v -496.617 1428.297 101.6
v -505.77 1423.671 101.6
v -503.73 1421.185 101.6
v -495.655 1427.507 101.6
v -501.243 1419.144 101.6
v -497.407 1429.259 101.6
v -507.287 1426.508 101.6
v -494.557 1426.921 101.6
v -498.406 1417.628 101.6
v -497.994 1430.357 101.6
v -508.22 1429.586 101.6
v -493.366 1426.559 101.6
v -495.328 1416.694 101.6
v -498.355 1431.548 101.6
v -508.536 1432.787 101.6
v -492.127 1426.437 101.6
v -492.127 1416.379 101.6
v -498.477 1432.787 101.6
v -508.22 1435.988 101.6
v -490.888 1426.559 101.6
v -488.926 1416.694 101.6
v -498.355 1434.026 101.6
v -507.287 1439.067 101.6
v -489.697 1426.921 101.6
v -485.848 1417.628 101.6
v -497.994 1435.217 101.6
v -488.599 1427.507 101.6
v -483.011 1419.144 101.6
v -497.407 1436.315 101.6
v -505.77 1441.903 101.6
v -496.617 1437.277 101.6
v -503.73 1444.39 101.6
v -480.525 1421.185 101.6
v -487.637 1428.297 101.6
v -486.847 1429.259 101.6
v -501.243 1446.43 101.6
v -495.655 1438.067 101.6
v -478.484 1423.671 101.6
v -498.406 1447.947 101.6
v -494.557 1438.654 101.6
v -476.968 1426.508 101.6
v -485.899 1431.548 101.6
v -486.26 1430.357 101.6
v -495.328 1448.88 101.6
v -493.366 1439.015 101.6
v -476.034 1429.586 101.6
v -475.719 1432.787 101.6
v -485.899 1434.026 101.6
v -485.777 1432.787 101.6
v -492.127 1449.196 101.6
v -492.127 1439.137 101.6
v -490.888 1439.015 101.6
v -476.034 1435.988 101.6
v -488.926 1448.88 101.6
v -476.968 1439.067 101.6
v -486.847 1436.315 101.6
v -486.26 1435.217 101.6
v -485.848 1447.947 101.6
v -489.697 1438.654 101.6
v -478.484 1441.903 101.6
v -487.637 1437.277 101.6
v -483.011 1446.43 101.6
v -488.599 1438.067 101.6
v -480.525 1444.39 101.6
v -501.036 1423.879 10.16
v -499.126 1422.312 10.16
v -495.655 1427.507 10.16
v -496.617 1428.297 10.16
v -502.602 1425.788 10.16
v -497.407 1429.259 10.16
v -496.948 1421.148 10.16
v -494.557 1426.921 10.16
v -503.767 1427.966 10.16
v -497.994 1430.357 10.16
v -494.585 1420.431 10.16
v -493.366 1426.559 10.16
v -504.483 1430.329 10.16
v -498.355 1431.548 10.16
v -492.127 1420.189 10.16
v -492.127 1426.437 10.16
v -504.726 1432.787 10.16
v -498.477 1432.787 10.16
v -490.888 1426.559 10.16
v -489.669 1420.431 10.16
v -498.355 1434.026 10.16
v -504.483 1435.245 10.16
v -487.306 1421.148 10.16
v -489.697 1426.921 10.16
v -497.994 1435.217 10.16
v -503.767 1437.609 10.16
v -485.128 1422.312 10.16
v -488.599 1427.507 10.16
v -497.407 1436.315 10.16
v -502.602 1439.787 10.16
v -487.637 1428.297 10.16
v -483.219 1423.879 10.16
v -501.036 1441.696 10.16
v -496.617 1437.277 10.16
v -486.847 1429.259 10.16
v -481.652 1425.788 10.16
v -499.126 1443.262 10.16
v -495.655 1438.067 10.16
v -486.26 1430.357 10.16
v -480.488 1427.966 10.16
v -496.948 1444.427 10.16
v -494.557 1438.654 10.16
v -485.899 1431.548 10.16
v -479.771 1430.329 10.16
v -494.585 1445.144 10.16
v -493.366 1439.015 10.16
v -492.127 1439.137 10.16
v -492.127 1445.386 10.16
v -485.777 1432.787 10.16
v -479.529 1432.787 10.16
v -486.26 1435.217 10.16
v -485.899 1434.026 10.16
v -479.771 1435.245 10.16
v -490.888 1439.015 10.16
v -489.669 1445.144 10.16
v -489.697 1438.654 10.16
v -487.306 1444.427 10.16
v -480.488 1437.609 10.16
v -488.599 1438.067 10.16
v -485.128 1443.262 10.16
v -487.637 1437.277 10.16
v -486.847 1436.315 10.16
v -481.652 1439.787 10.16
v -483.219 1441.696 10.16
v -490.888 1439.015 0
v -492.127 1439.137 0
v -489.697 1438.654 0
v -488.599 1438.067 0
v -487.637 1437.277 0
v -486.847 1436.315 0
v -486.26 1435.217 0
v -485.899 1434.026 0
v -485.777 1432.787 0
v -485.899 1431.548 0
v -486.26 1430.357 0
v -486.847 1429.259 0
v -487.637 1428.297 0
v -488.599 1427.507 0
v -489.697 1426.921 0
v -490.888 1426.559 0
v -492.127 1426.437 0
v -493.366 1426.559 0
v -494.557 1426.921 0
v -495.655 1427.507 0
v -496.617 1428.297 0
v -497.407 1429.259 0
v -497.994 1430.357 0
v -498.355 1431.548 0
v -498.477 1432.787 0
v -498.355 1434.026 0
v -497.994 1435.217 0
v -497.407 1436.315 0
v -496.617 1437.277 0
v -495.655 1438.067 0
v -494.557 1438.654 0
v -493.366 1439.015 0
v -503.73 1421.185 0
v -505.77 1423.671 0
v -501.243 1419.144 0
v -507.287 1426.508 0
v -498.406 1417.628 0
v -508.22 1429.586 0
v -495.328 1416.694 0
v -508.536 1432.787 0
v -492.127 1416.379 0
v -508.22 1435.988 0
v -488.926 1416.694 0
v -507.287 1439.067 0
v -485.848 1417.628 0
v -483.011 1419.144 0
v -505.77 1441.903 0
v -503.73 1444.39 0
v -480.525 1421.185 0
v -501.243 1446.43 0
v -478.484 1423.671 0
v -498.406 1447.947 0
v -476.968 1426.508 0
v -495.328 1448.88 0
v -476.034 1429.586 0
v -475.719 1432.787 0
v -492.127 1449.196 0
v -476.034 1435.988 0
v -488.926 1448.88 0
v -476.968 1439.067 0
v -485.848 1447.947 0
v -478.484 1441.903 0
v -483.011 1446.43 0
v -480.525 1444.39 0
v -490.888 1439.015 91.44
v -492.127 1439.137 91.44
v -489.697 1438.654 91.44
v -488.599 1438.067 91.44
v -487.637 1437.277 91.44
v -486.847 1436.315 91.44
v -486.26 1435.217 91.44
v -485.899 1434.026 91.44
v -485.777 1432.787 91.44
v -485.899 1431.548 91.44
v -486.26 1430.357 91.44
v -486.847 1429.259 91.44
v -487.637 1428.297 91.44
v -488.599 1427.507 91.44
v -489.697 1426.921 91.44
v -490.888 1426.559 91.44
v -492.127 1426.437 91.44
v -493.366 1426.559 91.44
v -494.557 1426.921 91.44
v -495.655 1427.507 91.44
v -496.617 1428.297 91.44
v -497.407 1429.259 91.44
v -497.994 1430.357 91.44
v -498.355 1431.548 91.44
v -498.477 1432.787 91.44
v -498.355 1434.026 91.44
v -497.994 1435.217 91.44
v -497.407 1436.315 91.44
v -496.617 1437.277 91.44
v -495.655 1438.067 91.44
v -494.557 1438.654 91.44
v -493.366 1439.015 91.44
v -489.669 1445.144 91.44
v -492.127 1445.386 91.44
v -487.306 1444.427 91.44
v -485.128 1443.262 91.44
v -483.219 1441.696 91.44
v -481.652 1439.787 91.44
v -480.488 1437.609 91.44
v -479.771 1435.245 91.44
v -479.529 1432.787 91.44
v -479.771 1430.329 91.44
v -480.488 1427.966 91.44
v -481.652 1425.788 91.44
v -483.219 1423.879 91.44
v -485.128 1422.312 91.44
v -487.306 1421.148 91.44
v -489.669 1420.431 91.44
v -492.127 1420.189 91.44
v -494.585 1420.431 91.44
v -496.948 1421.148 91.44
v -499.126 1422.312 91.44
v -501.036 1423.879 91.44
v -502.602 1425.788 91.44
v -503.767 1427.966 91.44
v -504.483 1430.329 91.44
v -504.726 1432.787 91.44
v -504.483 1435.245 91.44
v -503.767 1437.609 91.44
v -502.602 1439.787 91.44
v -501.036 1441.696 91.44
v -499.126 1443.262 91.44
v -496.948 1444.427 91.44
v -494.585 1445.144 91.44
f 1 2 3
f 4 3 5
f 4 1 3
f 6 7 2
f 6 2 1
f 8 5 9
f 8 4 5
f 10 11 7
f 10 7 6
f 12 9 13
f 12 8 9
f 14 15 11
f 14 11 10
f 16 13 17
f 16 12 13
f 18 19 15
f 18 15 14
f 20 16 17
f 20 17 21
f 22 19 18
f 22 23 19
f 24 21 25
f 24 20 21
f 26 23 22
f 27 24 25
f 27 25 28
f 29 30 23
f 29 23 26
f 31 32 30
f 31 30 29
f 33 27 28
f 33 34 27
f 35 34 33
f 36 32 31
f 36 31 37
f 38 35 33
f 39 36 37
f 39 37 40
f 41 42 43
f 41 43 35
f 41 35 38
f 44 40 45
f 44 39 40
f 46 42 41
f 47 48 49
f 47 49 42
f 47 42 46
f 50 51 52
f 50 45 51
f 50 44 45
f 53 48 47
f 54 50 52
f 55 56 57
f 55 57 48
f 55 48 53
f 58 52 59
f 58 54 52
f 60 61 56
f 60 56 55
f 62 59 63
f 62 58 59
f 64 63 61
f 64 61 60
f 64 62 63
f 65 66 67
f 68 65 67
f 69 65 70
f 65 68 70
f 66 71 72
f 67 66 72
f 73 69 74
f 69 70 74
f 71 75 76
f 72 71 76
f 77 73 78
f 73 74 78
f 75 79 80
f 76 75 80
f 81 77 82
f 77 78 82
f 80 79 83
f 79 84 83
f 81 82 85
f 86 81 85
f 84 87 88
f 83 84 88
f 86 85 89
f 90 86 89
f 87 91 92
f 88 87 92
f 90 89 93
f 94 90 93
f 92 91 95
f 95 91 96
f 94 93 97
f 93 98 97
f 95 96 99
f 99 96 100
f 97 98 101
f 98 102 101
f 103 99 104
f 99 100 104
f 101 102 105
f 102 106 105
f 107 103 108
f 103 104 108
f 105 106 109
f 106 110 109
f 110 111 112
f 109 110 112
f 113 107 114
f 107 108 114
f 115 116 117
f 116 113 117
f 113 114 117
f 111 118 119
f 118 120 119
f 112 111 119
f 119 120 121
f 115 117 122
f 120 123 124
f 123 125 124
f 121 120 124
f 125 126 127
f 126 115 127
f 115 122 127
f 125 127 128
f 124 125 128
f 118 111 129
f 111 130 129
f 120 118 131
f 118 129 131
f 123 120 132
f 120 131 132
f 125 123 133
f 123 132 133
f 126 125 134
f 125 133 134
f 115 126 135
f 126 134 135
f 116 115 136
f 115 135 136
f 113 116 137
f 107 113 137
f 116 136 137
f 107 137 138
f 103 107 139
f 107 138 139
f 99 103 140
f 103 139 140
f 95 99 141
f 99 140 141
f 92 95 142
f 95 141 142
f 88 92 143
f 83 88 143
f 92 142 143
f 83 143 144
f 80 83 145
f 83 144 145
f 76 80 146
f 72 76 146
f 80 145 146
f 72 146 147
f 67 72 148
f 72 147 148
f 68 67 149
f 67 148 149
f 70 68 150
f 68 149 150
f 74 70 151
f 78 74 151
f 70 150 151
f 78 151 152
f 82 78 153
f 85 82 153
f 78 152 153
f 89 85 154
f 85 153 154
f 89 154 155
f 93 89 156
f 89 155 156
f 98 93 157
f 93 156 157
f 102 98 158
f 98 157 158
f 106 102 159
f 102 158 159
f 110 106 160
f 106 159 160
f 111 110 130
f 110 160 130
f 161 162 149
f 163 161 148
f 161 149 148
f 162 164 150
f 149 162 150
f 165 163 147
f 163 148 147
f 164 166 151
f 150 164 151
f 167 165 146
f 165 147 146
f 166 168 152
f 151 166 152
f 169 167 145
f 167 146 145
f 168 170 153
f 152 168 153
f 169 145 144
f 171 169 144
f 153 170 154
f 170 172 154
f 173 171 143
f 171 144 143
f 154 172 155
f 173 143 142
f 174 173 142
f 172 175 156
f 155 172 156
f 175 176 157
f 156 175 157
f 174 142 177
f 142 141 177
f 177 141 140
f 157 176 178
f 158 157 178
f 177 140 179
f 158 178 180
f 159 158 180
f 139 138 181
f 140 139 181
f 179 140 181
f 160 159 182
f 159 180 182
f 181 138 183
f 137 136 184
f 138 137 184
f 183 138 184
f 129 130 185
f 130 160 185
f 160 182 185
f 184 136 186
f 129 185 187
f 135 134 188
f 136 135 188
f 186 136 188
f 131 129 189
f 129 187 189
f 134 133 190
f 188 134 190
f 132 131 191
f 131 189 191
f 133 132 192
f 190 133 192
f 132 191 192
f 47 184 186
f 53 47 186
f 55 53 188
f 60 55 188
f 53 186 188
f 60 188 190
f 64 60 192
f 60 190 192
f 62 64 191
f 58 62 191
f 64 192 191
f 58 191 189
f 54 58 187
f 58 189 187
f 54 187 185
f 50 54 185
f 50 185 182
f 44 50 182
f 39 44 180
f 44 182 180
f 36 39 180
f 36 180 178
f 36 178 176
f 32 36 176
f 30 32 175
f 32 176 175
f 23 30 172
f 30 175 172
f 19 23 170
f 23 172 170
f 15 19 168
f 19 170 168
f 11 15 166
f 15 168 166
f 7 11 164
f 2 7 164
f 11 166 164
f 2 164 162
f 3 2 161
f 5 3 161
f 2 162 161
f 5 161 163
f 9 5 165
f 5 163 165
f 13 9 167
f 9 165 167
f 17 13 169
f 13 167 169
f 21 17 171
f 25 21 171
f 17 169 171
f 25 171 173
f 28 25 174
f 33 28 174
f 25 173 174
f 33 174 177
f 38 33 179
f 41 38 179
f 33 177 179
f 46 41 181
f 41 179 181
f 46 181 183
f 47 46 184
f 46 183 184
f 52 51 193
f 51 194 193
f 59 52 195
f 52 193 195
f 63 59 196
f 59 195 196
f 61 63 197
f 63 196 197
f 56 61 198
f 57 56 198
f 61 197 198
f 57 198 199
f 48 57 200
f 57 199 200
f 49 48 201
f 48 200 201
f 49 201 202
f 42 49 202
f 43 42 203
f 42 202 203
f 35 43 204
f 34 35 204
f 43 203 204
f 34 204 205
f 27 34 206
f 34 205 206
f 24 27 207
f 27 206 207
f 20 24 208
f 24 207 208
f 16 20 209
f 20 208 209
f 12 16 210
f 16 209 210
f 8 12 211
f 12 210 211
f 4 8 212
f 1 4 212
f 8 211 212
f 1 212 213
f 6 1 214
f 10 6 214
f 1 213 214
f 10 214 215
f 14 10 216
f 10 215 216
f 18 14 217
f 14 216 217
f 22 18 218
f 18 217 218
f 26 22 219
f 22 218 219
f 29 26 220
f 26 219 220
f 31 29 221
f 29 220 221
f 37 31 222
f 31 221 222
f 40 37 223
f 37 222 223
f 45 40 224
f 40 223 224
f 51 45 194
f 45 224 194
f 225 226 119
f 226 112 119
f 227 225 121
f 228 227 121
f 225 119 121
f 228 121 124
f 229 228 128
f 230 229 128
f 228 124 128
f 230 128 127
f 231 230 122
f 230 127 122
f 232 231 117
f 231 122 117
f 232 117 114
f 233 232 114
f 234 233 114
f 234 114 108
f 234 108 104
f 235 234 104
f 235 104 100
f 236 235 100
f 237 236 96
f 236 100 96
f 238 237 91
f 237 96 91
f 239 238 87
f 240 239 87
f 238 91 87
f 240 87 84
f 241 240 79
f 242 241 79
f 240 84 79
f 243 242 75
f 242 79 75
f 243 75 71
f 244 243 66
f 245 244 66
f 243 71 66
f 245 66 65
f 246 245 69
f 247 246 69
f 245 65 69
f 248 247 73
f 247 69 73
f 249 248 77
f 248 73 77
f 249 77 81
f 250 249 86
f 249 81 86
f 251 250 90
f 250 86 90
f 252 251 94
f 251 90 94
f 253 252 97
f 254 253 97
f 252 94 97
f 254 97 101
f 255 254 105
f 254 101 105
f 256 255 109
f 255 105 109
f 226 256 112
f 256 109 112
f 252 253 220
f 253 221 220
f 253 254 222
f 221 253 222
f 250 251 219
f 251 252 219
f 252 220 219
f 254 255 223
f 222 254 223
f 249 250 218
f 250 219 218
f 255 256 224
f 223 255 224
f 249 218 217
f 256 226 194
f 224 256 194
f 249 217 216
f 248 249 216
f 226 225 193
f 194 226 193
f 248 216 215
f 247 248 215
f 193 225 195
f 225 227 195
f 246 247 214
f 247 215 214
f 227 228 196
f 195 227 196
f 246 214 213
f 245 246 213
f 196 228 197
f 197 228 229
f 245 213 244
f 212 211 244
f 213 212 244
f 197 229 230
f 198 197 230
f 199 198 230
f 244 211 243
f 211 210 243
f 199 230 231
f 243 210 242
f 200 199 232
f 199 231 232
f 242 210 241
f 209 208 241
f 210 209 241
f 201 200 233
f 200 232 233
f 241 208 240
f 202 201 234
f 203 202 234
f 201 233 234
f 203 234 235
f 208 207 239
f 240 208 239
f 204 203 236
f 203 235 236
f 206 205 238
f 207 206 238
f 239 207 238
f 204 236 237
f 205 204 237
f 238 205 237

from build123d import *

# Parameters (mm, degrees)
SKETCH1_R           = 16.4084
BOSS_EXTRUDE1_DEPTH = 101.6


with BuildPart() as part:
    # Sketch1 → Boss-Extrude1 (new body)
    with BuildSketch(Plane.XY):
        with Locations((-492.127121378, 1432.787310137)):
            Circle(SKETCH1_R)
    extrude(amount=BOSS_EXTRUDE1_DEPTH)

    # Sketch3 → Cut-Revolve1 (revolve, cut)
    with BuildSketch(Plane(origin=(-492.127121378, 0, 0), x_dir=(0, 0, -1), z_dir=(1, 0, 0))):
        Polygon((-91.44, 1445.385710137), (-10.16, 1445.385710137), (-10.16, 1439.137310137), (0, 1439.137310137), (0, 1432.787310137), (-101.6, 1432.787310137), (-101.6, 1439.137310137), (-91.44, 1439.137310137), align=None)
    revolve(axis=Axis((-492.127121378, 1432.787310137, 101.6), (0, 0, -1)), mode=Mode.SUBTRACT)


solid = part.part
